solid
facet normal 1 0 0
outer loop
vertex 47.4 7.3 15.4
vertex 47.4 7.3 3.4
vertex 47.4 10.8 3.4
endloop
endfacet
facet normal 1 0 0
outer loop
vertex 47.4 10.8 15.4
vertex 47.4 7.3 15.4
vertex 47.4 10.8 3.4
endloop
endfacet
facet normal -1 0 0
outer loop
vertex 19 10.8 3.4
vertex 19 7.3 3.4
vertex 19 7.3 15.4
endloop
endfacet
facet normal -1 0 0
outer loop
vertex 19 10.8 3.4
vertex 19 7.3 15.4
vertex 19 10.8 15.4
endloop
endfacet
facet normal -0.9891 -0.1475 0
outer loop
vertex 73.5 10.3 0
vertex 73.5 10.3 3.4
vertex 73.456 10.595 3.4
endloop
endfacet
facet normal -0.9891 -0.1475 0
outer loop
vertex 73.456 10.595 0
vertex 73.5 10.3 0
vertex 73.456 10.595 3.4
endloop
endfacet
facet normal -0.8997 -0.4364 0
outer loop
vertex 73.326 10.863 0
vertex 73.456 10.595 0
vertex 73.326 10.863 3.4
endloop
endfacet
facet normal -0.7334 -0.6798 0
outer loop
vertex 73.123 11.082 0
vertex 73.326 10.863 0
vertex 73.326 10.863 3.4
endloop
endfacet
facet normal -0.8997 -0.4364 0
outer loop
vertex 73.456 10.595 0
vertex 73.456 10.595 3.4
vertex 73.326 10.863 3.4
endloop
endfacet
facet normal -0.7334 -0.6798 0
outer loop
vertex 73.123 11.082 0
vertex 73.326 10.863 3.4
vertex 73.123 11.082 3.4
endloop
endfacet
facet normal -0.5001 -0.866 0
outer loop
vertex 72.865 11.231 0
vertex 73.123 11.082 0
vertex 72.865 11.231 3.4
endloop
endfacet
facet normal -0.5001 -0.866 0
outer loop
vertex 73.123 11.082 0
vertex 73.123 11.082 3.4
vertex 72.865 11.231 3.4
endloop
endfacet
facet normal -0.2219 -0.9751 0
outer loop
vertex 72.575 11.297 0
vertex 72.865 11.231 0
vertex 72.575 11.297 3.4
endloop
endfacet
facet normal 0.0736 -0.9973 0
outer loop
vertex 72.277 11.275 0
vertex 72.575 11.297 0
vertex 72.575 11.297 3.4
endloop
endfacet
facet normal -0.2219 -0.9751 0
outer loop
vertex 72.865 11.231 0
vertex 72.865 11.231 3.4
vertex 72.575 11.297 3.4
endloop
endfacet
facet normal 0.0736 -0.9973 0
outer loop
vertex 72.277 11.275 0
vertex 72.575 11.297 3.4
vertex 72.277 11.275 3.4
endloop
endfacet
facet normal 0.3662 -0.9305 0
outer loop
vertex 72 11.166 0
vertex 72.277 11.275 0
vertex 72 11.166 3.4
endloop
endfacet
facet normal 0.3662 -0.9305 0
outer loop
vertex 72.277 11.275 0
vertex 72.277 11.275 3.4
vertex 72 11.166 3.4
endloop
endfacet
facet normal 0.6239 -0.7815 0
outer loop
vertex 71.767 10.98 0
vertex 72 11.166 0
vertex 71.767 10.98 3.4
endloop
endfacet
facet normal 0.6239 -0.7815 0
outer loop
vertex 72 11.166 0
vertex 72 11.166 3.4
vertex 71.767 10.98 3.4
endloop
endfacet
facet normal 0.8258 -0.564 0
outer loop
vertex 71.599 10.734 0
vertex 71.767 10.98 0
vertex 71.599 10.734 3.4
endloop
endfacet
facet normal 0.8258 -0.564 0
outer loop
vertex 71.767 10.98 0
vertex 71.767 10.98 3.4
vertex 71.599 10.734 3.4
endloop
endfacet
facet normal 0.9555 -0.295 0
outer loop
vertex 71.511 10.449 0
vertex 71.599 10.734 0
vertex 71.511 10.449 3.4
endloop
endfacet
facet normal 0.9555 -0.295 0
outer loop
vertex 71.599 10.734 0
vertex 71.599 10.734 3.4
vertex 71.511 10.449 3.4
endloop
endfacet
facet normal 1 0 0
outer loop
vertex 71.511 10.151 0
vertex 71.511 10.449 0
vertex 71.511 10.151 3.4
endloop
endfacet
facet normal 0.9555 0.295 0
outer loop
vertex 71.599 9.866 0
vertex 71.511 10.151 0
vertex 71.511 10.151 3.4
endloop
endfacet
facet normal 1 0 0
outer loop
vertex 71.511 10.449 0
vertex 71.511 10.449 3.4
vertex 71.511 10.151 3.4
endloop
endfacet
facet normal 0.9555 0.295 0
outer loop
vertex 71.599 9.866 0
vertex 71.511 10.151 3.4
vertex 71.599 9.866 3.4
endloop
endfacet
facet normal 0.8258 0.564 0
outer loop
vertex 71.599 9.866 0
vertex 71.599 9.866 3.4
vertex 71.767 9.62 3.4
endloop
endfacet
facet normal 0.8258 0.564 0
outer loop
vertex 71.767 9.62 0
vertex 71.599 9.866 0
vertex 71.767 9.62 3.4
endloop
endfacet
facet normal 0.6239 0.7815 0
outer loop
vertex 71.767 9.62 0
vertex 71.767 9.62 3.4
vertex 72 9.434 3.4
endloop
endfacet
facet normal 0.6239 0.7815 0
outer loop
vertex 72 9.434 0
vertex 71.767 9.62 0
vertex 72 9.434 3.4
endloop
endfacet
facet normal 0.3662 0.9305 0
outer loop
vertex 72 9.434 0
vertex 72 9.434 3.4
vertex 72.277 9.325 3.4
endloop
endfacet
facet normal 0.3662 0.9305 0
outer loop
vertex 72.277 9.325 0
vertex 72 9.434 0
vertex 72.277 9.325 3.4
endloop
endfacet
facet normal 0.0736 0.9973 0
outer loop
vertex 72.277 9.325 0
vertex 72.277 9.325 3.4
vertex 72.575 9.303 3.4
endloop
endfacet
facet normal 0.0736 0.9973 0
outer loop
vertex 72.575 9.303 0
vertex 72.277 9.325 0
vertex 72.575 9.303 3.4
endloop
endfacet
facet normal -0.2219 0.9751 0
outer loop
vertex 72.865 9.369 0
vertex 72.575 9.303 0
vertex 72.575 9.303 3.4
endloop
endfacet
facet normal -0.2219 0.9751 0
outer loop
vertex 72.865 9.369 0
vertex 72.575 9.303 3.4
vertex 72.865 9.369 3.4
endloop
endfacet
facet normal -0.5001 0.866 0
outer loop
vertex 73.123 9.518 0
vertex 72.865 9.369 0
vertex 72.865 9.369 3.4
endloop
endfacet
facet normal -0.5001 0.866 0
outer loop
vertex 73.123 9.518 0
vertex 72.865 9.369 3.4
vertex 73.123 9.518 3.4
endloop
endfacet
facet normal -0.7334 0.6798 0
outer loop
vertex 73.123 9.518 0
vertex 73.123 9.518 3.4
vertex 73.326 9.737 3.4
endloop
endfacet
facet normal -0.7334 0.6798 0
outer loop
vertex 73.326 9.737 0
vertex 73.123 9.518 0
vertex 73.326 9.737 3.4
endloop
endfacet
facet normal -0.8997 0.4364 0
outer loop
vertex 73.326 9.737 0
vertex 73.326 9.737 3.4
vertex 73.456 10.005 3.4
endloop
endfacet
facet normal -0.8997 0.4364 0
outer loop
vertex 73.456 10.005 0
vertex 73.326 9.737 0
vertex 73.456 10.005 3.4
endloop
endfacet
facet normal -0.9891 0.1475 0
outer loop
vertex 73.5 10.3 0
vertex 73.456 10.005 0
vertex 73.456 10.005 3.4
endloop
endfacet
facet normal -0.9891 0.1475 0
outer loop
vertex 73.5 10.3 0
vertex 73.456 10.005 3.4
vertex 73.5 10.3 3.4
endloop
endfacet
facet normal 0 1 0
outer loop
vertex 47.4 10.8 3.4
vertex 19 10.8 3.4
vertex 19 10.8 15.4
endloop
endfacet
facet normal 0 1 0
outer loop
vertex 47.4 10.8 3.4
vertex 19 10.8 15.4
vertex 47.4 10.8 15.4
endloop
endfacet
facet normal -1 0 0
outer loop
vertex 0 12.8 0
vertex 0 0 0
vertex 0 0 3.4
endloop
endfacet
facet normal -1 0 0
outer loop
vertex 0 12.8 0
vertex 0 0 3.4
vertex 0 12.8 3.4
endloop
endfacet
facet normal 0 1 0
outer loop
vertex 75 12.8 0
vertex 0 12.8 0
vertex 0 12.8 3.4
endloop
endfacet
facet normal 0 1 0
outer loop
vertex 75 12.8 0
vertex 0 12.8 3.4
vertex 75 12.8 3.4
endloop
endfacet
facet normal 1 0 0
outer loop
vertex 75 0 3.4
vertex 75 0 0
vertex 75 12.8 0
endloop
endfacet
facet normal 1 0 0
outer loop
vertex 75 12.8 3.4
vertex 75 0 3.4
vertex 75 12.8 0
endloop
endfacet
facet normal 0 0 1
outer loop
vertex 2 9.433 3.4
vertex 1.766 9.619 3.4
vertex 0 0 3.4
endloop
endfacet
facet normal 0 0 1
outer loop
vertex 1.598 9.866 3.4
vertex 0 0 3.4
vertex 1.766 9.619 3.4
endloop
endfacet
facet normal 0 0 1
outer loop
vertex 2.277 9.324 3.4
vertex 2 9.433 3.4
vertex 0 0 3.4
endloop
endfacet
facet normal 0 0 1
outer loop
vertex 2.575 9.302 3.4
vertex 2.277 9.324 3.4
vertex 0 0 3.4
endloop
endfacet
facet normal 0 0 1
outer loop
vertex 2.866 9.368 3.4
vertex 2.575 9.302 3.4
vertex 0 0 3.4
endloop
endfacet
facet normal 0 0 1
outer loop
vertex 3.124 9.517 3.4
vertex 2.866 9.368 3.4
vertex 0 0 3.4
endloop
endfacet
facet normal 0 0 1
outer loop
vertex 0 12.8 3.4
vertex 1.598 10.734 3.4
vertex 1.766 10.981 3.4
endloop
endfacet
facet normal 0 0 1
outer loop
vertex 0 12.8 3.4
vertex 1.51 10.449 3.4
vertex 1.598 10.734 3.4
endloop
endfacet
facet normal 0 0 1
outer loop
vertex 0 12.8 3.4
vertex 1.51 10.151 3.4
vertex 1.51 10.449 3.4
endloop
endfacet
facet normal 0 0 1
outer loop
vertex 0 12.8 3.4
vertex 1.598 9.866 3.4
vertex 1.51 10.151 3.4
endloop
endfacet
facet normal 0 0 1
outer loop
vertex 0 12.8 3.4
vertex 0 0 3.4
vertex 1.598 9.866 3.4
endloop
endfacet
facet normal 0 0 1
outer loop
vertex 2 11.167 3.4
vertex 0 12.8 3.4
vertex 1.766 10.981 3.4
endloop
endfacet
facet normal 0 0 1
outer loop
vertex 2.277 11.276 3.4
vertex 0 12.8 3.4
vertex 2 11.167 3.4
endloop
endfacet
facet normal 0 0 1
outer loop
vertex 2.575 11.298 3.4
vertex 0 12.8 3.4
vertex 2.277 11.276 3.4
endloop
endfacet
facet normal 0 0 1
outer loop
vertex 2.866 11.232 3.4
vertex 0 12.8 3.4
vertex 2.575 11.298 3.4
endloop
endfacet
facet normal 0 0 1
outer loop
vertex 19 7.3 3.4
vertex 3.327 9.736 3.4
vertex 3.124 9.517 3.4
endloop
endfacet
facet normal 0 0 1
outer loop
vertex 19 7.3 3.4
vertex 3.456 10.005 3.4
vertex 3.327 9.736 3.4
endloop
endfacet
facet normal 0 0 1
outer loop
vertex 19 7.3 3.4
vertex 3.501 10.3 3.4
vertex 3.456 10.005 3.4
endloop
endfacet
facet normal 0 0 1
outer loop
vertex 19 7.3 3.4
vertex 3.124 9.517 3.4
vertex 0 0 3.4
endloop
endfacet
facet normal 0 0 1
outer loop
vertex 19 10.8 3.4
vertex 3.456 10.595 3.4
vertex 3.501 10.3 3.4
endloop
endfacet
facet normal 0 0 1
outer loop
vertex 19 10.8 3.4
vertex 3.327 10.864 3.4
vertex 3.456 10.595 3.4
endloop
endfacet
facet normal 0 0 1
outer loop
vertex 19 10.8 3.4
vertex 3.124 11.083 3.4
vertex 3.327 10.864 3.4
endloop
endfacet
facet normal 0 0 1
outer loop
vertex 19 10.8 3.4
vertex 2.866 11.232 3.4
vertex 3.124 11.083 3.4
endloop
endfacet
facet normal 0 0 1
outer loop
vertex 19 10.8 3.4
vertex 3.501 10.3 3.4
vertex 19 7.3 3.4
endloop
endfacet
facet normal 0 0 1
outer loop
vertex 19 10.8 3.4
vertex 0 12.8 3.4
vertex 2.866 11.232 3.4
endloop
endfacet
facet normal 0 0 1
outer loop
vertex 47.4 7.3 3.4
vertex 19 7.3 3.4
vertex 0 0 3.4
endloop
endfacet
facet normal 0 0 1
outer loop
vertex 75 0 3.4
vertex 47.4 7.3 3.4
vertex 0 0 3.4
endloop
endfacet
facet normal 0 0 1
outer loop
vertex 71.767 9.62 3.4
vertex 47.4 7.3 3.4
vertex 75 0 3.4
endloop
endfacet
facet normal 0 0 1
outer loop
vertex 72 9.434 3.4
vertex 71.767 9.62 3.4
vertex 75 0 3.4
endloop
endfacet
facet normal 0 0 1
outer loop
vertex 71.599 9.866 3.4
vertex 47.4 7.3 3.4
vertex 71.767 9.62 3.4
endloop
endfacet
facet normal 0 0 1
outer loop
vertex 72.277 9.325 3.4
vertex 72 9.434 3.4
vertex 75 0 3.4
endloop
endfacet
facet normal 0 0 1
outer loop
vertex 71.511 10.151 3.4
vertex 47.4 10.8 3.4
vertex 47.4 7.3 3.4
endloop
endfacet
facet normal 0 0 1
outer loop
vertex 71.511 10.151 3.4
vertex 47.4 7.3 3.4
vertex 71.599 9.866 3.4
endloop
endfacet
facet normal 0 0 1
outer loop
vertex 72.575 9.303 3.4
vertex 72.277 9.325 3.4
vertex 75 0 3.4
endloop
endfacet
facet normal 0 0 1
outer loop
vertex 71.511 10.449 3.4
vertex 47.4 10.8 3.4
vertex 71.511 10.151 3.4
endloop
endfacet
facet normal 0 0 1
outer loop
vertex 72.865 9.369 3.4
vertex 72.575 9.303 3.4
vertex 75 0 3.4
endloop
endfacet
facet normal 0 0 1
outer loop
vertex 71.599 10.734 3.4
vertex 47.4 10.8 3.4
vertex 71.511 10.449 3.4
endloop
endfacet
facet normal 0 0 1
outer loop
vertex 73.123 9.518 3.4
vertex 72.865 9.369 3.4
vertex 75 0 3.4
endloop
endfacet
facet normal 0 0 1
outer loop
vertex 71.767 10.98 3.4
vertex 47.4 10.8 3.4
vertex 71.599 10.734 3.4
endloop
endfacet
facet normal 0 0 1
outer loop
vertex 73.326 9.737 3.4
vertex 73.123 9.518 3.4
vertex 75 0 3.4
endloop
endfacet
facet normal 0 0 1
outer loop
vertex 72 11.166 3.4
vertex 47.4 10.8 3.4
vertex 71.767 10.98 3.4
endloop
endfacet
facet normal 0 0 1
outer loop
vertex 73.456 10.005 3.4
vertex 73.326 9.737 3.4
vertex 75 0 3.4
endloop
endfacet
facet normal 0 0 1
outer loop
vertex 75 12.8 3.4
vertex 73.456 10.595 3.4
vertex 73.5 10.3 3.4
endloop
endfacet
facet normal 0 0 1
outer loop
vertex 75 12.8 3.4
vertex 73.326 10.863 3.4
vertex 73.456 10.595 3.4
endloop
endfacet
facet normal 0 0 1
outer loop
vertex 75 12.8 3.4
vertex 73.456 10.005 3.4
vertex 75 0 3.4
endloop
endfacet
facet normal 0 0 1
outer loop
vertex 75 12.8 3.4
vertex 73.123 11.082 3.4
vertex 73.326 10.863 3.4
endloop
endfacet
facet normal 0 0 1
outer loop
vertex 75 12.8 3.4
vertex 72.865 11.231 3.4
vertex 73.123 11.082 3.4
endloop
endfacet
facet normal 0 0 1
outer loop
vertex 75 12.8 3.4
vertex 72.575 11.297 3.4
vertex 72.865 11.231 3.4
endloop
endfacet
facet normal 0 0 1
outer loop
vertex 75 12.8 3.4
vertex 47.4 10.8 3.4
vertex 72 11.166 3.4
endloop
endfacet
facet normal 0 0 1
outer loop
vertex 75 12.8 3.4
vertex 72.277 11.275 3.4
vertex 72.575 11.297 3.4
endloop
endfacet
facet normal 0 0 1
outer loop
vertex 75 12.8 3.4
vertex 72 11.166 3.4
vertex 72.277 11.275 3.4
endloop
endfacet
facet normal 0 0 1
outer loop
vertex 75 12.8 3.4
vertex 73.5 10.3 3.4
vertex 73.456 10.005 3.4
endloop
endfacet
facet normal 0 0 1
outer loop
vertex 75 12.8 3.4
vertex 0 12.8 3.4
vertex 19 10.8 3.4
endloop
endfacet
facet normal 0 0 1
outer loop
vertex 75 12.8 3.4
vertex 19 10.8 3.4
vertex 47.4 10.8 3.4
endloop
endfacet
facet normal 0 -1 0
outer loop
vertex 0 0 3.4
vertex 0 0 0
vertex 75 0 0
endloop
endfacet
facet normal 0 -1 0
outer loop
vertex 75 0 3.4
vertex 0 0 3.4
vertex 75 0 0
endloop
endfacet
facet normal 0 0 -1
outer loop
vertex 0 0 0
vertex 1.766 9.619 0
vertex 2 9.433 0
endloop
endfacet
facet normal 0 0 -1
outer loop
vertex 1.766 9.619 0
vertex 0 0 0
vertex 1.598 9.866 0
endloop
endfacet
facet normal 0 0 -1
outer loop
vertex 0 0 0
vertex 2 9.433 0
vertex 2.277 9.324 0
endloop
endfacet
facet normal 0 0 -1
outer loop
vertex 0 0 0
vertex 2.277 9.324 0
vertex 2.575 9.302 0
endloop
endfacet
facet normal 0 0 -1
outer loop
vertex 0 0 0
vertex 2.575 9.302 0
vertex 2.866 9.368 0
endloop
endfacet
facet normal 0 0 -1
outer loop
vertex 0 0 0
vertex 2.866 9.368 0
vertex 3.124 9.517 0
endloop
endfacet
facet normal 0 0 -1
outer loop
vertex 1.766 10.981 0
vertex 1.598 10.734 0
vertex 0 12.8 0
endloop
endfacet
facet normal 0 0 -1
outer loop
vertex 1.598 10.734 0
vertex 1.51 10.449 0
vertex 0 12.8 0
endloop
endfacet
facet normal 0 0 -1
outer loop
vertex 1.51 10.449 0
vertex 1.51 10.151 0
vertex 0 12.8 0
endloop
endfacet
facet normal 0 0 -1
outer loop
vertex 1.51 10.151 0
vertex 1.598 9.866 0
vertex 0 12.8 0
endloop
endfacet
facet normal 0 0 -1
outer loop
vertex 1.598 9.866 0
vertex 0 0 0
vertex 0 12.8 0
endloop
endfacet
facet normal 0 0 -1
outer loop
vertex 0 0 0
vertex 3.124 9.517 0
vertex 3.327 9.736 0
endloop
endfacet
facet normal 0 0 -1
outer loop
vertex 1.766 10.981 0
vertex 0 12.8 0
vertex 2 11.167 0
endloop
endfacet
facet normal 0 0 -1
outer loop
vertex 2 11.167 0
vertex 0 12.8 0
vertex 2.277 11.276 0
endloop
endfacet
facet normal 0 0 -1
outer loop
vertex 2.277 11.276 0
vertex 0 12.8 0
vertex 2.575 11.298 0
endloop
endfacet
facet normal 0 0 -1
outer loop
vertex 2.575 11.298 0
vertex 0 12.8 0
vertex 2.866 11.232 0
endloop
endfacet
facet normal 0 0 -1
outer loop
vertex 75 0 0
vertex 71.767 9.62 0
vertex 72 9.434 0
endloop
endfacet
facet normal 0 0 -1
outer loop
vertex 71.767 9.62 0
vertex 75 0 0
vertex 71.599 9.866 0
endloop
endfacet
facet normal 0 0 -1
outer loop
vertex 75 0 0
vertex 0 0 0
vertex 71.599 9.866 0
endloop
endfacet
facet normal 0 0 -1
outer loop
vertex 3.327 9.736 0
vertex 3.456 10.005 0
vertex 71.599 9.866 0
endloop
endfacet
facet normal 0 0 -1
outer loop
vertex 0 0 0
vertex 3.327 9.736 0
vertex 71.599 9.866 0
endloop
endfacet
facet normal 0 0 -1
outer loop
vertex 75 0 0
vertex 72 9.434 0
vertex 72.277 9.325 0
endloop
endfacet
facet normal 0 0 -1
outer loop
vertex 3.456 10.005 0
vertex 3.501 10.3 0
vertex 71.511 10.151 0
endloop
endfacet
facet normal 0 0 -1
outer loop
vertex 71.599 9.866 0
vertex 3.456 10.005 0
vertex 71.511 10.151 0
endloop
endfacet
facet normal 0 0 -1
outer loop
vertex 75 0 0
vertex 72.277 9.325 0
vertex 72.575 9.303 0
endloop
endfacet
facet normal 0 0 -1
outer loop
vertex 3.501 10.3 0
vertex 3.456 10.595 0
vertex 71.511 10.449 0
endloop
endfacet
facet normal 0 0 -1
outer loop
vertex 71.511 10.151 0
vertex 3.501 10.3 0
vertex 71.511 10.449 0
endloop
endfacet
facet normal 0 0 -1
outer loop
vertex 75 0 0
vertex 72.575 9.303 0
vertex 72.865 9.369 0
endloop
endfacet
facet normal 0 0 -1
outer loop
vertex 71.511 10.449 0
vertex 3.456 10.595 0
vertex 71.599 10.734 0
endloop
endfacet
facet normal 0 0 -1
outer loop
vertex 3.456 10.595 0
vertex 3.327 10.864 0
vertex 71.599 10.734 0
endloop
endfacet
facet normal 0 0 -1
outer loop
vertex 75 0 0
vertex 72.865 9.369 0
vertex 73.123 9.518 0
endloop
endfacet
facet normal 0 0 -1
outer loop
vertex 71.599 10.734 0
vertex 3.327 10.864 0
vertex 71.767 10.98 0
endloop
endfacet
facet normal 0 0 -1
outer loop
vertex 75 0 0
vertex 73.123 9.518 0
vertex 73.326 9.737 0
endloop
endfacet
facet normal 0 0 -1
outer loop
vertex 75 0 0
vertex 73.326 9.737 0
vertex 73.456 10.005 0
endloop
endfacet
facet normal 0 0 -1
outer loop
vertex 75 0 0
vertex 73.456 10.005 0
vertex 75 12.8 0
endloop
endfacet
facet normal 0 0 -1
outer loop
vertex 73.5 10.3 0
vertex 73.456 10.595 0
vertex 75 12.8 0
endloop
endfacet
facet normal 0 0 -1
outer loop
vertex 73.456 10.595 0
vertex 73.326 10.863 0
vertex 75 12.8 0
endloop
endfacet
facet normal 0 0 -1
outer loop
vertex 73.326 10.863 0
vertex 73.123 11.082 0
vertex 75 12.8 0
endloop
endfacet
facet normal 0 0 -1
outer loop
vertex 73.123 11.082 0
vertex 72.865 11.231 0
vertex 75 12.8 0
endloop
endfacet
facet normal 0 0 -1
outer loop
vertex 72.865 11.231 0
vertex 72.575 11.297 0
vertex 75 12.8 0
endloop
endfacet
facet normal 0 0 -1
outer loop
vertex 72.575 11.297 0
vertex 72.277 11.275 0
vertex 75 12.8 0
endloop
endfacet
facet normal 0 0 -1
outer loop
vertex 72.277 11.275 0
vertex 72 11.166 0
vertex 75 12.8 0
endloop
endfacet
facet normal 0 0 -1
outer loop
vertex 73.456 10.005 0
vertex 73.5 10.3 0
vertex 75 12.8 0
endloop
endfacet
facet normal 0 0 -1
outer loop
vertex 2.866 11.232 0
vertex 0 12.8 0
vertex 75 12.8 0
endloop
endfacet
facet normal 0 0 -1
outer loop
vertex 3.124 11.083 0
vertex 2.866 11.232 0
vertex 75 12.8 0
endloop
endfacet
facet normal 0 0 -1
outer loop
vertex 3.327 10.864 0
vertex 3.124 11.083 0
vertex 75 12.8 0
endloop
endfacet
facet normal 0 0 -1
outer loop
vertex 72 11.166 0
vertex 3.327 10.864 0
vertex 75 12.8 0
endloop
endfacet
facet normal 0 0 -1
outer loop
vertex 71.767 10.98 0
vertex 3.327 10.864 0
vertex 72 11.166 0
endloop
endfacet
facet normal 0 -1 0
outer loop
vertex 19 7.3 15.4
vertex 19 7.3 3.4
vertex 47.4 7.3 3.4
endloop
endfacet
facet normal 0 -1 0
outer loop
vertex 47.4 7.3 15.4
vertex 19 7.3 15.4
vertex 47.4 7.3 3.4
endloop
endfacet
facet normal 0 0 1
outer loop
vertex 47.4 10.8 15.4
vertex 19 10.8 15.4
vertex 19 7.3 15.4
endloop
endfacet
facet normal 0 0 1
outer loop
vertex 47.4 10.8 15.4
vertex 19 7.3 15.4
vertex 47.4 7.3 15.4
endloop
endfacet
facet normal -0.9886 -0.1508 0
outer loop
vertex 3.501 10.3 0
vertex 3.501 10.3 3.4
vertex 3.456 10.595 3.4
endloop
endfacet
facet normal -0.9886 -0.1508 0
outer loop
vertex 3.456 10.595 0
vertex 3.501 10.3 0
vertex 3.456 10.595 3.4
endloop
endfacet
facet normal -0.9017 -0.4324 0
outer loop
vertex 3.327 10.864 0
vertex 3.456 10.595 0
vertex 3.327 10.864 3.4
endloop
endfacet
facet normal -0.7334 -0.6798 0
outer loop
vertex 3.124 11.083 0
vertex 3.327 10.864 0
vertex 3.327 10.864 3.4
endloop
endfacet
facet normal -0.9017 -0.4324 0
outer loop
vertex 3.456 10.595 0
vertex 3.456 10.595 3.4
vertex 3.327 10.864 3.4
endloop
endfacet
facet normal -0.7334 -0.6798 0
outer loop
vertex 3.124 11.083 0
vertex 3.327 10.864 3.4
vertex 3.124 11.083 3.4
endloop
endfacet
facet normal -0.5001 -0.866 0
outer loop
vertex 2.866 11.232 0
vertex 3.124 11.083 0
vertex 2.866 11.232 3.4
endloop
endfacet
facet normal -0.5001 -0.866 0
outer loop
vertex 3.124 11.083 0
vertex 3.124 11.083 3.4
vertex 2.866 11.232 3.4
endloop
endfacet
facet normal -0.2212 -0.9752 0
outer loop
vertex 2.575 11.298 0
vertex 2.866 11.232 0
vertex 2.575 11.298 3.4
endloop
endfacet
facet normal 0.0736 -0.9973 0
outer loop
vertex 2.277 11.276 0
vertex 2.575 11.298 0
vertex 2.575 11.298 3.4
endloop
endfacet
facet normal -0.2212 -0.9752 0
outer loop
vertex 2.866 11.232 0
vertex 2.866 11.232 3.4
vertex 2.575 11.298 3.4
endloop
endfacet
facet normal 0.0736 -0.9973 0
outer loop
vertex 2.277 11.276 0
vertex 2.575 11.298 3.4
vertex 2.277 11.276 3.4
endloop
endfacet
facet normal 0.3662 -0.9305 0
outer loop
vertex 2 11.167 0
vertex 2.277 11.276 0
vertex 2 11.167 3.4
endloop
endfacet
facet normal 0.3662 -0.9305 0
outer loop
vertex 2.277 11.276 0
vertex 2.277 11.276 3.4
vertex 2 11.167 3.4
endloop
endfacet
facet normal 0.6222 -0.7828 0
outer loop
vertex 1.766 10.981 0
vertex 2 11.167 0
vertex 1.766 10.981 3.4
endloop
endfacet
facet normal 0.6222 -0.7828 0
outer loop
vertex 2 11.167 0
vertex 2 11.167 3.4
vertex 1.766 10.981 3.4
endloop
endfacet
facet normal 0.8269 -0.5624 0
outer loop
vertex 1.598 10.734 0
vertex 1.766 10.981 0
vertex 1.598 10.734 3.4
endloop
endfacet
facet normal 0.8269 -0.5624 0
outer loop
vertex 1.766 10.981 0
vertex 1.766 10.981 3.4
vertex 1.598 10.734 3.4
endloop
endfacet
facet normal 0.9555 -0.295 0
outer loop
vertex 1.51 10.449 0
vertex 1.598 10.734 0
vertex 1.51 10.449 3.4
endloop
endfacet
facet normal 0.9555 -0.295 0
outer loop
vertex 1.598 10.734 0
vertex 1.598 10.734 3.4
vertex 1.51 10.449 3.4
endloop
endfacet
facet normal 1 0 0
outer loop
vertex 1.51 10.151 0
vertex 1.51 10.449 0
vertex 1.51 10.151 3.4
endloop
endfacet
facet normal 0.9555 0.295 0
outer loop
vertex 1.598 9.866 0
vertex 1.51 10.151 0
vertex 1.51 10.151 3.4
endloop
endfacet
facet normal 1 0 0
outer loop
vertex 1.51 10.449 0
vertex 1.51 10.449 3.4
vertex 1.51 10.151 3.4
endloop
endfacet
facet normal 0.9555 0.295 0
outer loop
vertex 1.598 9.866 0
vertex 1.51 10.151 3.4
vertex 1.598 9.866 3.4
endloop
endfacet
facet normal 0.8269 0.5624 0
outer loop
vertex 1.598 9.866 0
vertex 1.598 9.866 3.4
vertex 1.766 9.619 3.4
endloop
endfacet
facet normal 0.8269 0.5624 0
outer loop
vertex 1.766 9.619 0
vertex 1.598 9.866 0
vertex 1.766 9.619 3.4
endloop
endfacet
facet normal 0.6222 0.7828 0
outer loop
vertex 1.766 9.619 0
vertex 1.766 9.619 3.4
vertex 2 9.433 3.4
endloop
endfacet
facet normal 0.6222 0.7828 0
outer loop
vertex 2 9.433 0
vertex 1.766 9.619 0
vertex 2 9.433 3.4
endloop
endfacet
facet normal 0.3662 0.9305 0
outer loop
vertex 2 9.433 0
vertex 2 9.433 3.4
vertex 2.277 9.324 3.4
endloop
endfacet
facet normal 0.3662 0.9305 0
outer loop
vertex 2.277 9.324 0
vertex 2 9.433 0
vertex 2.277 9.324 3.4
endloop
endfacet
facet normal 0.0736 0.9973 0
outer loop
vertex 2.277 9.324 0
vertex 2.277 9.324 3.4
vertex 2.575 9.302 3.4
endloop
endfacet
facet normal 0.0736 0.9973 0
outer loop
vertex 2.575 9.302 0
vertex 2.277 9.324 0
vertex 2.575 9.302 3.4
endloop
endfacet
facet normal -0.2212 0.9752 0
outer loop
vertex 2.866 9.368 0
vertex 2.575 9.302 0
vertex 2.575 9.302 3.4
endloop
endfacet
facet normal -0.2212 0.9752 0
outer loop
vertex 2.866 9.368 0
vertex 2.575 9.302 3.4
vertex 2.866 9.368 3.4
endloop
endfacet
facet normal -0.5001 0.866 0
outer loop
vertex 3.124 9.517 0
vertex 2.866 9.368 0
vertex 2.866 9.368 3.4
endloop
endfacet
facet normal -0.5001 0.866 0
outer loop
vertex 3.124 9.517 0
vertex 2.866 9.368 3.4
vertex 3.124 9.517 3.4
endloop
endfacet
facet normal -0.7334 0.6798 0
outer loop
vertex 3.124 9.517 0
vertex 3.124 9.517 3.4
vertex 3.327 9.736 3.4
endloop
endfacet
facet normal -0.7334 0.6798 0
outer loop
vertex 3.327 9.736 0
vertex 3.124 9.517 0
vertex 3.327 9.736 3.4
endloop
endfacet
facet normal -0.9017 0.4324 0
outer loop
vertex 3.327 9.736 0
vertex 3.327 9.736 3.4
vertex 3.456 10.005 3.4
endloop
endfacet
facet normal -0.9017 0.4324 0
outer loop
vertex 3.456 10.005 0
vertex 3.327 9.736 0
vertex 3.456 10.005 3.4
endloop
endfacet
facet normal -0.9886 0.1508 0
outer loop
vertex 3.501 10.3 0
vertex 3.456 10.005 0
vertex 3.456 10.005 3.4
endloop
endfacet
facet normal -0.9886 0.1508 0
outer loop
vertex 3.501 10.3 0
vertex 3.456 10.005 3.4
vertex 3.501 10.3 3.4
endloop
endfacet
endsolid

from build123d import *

# Parameters (mm, degrees)
SKETCH1_W           = 75
SKETCH1_H           = 12.8
BOSS_EXTRUDE1_DEPTH = 3.4
SKETCH2_W           = 28.4
SKETCH2_H           = 3.5
BOSS_EXTRUDE2_DEPTH = 12
SKETCH2_3_R         = 1.000959723
SKETCH2_3_R_2       = 1
CUT_EXTRUDE1_DEPTH  = 12


with BuildPart() as part:
    # Sketch1 → Boss-Extrude1 (new body)
    with BuildSketch(Plane.XY):
        with Locations((37.5, 6.4)):
            Rectangle(SKETCH1_W, SKETCH1_H)
    extrude(amount=BOSS_EXTRUDE1_DEPTH)

    # Sketch2 → Boss-Extrude2 (add)
    with BuildSketch(Plane.XY.offset(3.4)):
        with Locations((33.2, 9.05)):
            Rectangle(SKETCH2_W, SKETCH2_H)
    extrude(amount=BOSS_EXTRUDE2_DEPTH)

    # Sketch2<3> → Cut-Extrude1 (cut)
    with BuildSketch(Plane.XY.offset(3.4)):
        with Locations((2.5, 10.3)):
            Circle(SKETCH2_3_R)
        with Locations((72.5, 10.3)):
            Circle(SKETCH2_3_R_2)
    extrude(amount=-CUT_EXTRUDE1_DEPTH, mode=Mode.SUBTRACT)


solid = part.part
